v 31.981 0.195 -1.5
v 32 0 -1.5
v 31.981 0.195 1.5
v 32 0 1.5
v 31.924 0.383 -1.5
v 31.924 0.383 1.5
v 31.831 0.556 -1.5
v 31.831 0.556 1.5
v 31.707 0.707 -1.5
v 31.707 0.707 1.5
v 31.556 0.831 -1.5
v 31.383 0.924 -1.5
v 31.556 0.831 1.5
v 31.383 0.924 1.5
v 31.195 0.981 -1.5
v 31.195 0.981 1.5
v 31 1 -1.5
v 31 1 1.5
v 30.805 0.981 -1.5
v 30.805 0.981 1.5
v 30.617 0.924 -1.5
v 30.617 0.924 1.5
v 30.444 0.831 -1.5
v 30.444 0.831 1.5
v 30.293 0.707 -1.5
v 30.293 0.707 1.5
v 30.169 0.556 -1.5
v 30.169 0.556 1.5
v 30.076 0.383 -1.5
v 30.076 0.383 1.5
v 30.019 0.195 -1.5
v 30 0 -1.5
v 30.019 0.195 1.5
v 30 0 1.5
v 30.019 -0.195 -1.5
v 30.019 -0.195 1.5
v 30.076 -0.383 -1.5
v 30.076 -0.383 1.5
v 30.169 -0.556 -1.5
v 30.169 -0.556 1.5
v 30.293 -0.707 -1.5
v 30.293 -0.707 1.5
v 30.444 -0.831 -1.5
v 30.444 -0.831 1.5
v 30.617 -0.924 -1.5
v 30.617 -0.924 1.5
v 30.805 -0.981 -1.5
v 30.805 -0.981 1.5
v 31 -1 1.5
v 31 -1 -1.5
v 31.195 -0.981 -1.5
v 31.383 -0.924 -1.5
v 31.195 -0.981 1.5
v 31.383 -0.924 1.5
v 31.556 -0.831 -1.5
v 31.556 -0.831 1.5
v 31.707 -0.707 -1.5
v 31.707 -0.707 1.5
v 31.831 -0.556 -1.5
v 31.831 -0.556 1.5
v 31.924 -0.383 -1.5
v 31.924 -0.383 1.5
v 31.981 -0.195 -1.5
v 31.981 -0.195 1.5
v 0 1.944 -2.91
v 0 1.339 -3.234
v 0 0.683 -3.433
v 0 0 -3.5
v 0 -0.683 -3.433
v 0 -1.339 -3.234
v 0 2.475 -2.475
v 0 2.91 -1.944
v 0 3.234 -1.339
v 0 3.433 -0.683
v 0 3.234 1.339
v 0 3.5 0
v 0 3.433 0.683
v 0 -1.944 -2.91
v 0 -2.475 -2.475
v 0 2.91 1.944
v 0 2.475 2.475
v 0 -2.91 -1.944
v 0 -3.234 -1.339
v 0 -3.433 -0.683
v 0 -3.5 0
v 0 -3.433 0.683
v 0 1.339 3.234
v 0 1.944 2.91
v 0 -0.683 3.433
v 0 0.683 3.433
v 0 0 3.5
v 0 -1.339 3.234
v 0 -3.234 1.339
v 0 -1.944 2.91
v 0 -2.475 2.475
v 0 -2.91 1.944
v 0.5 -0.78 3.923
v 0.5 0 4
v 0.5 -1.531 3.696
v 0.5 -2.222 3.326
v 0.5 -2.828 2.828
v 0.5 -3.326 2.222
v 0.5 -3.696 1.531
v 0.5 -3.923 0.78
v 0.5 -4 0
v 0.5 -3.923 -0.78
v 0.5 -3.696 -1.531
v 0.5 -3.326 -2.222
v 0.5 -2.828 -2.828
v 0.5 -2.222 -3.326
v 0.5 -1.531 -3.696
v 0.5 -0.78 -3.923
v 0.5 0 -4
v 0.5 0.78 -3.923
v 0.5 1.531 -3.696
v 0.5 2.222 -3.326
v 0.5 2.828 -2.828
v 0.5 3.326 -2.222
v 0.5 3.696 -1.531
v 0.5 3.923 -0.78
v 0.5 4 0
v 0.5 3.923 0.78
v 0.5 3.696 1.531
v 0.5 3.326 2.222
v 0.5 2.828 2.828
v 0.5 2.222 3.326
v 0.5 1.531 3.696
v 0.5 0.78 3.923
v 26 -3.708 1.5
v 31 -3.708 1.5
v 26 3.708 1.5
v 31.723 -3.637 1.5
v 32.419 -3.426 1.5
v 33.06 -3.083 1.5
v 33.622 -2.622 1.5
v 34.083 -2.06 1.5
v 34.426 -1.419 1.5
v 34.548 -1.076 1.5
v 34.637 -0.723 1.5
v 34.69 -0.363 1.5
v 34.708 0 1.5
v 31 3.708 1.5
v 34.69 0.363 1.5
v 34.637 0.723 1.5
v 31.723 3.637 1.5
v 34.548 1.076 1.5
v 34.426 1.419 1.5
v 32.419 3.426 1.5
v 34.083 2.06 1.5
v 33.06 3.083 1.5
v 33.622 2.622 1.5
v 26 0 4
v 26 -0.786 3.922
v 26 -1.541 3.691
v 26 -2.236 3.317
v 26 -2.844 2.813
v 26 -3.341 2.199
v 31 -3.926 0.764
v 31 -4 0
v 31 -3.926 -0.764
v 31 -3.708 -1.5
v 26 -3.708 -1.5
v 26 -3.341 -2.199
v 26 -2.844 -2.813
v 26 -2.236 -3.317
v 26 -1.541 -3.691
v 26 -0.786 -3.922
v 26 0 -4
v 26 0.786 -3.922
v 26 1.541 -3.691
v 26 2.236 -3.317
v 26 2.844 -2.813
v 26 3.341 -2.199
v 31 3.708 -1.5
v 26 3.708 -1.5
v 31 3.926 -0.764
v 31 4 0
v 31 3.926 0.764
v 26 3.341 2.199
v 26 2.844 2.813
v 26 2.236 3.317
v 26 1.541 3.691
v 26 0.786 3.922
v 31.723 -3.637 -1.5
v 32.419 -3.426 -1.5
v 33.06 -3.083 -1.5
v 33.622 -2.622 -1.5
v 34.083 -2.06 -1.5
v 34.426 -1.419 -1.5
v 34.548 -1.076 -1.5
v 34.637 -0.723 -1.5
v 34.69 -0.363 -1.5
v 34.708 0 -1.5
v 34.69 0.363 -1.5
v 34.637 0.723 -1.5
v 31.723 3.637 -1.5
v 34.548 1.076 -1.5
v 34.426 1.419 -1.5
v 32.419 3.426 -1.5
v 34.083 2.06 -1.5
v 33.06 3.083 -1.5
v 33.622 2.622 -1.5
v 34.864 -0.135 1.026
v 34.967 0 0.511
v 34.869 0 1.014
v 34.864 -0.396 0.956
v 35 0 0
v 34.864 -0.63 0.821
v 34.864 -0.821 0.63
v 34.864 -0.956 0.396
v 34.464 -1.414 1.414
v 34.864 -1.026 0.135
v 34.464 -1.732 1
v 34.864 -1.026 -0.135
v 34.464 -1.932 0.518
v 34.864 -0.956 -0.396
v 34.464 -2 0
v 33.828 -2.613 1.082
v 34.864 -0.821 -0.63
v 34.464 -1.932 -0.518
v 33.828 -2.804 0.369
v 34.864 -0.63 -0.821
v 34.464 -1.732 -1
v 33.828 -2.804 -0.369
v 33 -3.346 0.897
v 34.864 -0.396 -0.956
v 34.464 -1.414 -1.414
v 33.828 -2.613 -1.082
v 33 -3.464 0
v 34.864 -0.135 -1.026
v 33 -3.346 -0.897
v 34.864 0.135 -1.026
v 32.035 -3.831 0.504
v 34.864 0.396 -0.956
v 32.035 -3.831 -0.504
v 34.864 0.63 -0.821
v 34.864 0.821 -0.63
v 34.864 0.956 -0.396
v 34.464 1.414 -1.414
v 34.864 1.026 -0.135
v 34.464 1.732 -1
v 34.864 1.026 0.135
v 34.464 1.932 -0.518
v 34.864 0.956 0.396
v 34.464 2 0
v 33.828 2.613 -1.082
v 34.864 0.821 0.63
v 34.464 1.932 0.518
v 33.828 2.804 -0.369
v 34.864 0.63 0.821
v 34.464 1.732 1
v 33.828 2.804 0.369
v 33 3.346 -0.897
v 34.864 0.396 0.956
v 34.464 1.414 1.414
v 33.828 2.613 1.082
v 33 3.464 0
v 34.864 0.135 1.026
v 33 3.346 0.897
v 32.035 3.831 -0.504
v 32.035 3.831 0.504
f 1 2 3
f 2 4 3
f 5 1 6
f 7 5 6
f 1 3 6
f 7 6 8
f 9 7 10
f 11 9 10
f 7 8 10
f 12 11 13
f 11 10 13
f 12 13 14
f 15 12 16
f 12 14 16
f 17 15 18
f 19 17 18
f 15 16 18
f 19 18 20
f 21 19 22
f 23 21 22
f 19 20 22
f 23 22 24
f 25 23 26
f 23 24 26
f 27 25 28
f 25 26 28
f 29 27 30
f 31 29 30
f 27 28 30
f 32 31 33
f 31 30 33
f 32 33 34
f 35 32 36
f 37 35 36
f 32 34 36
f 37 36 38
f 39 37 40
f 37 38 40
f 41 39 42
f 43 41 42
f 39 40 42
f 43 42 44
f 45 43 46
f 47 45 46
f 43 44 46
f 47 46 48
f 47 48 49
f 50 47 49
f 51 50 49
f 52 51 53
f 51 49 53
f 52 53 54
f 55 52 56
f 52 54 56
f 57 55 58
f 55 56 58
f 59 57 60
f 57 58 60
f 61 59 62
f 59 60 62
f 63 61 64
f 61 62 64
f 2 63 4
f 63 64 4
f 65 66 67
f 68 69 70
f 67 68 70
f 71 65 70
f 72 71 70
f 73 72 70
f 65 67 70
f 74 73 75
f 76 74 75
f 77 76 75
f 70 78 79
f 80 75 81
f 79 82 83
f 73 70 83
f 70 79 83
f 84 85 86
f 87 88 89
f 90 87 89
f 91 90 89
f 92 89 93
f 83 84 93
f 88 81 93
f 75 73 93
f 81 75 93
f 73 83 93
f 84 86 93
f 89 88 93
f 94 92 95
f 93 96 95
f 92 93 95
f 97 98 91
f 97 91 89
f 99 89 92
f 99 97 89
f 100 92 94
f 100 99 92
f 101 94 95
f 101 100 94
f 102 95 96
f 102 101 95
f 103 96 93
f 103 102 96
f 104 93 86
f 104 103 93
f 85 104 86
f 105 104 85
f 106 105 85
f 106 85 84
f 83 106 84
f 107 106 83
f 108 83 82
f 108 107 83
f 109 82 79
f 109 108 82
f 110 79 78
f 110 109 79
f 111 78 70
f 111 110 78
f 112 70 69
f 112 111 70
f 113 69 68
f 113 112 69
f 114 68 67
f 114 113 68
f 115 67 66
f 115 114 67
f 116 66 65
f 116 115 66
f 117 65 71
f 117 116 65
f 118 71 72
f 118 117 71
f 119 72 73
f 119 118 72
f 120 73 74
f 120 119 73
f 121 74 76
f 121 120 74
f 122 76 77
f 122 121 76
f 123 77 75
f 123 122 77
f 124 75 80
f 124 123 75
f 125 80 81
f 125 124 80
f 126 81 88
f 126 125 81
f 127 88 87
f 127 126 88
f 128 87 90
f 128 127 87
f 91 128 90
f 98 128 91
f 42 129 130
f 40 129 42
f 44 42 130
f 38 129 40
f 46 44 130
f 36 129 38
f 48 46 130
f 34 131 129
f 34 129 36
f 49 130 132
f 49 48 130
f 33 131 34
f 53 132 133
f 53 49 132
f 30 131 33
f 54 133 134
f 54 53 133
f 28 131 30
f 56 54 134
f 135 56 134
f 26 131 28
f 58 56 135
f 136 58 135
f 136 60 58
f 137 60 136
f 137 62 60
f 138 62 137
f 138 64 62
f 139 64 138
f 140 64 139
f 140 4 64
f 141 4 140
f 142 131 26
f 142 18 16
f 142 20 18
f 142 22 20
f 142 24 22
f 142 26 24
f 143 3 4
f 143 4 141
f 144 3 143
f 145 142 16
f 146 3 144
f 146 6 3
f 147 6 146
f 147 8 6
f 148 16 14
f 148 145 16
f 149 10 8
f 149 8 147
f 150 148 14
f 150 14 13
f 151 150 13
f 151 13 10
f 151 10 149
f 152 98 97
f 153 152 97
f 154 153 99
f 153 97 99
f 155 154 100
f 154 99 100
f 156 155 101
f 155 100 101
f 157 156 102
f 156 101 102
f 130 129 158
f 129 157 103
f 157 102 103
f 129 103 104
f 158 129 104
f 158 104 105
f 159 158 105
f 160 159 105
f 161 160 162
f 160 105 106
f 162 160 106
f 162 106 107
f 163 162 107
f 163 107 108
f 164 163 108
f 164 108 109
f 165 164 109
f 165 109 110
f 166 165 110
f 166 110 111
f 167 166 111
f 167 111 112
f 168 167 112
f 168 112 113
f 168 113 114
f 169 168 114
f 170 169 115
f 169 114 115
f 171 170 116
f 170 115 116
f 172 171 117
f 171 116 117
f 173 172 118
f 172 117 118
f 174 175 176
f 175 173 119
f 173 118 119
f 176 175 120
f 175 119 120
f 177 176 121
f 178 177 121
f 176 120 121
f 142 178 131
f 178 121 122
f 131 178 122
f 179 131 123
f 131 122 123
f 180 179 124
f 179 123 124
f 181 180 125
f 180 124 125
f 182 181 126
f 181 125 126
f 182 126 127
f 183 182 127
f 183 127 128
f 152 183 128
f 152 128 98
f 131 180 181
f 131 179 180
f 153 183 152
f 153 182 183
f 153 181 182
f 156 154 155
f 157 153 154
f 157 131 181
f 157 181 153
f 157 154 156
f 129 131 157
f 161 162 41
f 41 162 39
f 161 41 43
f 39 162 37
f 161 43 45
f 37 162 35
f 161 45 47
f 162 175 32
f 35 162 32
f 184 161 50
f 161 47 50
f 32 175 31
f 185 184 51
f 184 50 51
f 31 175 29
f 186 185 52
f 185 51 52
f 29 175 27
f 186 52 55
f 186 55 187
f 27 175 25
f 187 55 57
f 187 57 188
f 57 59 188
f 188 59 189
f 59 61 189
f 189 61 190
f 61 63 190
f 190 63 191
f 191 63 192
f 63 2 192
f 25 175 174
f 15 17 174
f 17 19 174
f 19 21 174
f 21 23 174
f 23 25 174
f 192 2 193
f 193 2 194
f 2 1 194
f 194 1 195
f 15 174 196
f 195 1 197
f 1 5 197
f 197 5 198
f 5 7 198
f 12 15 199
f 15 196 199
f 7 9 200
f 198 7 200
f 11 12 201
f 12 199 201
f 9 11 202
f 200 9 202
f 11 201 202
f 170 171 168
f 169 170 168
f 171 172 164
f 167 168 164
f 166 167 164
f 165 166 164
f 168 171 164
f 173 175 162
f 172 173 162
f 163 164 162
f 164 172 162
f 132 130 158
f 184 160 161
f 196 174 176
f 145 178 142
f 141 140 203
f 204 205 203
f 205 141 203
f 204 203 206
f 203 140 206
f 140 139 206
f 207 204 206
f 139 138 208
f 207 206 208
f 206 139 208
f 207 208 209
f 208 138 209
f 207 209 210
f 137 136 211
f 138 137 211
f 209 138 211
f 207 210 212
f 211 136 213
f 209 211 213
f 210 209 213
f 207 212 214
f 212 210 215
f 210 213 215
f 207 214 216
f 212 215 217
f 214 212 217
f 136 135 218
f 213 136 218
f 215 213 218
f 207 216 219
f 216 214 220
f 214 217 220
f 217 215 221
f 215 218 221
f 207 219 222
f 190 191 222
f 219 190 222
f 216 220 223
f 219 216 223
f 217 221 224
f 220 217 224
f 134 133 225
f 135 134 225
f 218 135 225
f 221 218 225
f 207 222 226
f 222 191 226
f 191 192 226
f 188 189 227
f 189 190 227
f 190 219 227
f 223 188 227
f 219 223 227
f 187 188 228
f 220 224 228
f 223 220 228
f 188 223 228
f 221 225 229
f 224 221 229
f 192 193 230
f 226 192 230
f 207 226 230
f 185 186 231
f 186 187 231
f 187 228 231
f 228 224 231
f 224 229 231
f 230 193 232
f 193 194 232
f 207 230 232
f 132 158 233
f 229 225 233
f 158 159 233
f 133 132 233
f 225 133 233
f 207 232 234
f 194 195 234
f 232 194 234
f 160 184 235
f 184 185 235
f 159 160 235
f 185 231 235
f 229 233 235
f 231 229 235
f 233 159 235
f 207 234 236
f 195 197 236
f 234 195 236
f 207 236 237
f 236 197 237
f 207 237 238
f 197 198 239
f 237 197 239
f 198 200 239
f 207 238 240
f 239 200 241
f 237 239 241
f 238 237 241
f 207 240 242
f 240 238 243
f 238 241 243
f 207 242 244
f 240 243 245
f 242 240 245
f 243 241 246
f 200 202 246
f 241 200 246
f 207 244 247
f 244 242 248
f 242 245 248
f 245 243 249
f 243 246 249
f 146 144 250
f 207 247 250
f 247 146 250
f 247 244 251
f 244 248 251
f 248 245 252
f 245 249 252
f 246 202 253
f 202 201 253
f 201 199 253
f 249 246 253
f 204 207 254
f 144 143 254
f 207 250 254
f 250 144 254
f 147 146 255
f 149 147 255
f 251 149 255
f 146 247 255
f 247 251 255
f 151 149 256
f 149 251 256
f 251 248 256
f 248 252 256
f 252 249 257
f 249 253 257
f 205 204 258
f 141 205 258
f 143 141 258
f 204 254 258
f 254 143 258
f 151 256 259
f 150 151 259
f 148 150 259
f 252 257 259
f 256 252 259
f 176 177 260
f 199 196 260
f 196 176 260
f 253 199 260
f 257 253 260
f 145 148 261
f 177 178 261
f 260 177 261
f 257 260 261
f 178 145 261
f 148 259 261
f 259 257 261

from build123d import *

# Parameters (mm, degrees)
F2_SIZE  = 0.5
F4_START = -1.5
F4_DEPTH = 6.5
F5_R     = 1
F6_DEPTH = 1.5


# Not quite as in the source:
# - a pattern or mirror of a feature is missing from the dataset's text; its kind, count and spacing are read off the source's solid


with BuildPart() as f1:
    # F0 (on Front) → F1 (revolve)
    with BuildSketch(Plane.XZ):
        with BuildLine():
            Line((0, 4), (0, 0))
            Line((0, 0), (35, 0))
            ThreePointArc((35, 0), (33.8284271247, 2.8284271247), (31, 4))
            Line((31, 4), (0, 4))
        make_face()
    revolve(axis=Axis((22.9748431593, 0, 0), (1, 0, 0)))

    # F2
    f2_edges = [f1.edges().sort_by_distance(p)[0] for p in [
        (0, 0, -4),
    ]]
    chamfer(f2_edges, length=F2_SIZE)

    # F3 (on Top) → F4 (cut)
    with BuildSketch(Plane.XY.offset(F4_START)):
        with BuildLine():
            Line((26, -4), (31, -4))
            ThreePointArc((31, -4), (35, 0), (31, 4))
            Line((31, 4), (26, 4))
            Line((26, 4), (26, -4))
        make_face()
    f4 = extrude(amount=-F4_DEPTH, mode=Mode.SUBTRACT)

    # F4_copies: F4 across plane
    add(f4.mirror(Plane.XY), mode=Mode.SUBTRACT)

    # F5 (on Top) → F6 (cut, symmetric)
    with BuildSketch(Plane.XY):
        with Locations((31, 0)):
            Circle(F5_R)
    extrude(amount=F6_DEPTH, both=True, mode=Mode.SUBTRACT)


solid = f1.part
